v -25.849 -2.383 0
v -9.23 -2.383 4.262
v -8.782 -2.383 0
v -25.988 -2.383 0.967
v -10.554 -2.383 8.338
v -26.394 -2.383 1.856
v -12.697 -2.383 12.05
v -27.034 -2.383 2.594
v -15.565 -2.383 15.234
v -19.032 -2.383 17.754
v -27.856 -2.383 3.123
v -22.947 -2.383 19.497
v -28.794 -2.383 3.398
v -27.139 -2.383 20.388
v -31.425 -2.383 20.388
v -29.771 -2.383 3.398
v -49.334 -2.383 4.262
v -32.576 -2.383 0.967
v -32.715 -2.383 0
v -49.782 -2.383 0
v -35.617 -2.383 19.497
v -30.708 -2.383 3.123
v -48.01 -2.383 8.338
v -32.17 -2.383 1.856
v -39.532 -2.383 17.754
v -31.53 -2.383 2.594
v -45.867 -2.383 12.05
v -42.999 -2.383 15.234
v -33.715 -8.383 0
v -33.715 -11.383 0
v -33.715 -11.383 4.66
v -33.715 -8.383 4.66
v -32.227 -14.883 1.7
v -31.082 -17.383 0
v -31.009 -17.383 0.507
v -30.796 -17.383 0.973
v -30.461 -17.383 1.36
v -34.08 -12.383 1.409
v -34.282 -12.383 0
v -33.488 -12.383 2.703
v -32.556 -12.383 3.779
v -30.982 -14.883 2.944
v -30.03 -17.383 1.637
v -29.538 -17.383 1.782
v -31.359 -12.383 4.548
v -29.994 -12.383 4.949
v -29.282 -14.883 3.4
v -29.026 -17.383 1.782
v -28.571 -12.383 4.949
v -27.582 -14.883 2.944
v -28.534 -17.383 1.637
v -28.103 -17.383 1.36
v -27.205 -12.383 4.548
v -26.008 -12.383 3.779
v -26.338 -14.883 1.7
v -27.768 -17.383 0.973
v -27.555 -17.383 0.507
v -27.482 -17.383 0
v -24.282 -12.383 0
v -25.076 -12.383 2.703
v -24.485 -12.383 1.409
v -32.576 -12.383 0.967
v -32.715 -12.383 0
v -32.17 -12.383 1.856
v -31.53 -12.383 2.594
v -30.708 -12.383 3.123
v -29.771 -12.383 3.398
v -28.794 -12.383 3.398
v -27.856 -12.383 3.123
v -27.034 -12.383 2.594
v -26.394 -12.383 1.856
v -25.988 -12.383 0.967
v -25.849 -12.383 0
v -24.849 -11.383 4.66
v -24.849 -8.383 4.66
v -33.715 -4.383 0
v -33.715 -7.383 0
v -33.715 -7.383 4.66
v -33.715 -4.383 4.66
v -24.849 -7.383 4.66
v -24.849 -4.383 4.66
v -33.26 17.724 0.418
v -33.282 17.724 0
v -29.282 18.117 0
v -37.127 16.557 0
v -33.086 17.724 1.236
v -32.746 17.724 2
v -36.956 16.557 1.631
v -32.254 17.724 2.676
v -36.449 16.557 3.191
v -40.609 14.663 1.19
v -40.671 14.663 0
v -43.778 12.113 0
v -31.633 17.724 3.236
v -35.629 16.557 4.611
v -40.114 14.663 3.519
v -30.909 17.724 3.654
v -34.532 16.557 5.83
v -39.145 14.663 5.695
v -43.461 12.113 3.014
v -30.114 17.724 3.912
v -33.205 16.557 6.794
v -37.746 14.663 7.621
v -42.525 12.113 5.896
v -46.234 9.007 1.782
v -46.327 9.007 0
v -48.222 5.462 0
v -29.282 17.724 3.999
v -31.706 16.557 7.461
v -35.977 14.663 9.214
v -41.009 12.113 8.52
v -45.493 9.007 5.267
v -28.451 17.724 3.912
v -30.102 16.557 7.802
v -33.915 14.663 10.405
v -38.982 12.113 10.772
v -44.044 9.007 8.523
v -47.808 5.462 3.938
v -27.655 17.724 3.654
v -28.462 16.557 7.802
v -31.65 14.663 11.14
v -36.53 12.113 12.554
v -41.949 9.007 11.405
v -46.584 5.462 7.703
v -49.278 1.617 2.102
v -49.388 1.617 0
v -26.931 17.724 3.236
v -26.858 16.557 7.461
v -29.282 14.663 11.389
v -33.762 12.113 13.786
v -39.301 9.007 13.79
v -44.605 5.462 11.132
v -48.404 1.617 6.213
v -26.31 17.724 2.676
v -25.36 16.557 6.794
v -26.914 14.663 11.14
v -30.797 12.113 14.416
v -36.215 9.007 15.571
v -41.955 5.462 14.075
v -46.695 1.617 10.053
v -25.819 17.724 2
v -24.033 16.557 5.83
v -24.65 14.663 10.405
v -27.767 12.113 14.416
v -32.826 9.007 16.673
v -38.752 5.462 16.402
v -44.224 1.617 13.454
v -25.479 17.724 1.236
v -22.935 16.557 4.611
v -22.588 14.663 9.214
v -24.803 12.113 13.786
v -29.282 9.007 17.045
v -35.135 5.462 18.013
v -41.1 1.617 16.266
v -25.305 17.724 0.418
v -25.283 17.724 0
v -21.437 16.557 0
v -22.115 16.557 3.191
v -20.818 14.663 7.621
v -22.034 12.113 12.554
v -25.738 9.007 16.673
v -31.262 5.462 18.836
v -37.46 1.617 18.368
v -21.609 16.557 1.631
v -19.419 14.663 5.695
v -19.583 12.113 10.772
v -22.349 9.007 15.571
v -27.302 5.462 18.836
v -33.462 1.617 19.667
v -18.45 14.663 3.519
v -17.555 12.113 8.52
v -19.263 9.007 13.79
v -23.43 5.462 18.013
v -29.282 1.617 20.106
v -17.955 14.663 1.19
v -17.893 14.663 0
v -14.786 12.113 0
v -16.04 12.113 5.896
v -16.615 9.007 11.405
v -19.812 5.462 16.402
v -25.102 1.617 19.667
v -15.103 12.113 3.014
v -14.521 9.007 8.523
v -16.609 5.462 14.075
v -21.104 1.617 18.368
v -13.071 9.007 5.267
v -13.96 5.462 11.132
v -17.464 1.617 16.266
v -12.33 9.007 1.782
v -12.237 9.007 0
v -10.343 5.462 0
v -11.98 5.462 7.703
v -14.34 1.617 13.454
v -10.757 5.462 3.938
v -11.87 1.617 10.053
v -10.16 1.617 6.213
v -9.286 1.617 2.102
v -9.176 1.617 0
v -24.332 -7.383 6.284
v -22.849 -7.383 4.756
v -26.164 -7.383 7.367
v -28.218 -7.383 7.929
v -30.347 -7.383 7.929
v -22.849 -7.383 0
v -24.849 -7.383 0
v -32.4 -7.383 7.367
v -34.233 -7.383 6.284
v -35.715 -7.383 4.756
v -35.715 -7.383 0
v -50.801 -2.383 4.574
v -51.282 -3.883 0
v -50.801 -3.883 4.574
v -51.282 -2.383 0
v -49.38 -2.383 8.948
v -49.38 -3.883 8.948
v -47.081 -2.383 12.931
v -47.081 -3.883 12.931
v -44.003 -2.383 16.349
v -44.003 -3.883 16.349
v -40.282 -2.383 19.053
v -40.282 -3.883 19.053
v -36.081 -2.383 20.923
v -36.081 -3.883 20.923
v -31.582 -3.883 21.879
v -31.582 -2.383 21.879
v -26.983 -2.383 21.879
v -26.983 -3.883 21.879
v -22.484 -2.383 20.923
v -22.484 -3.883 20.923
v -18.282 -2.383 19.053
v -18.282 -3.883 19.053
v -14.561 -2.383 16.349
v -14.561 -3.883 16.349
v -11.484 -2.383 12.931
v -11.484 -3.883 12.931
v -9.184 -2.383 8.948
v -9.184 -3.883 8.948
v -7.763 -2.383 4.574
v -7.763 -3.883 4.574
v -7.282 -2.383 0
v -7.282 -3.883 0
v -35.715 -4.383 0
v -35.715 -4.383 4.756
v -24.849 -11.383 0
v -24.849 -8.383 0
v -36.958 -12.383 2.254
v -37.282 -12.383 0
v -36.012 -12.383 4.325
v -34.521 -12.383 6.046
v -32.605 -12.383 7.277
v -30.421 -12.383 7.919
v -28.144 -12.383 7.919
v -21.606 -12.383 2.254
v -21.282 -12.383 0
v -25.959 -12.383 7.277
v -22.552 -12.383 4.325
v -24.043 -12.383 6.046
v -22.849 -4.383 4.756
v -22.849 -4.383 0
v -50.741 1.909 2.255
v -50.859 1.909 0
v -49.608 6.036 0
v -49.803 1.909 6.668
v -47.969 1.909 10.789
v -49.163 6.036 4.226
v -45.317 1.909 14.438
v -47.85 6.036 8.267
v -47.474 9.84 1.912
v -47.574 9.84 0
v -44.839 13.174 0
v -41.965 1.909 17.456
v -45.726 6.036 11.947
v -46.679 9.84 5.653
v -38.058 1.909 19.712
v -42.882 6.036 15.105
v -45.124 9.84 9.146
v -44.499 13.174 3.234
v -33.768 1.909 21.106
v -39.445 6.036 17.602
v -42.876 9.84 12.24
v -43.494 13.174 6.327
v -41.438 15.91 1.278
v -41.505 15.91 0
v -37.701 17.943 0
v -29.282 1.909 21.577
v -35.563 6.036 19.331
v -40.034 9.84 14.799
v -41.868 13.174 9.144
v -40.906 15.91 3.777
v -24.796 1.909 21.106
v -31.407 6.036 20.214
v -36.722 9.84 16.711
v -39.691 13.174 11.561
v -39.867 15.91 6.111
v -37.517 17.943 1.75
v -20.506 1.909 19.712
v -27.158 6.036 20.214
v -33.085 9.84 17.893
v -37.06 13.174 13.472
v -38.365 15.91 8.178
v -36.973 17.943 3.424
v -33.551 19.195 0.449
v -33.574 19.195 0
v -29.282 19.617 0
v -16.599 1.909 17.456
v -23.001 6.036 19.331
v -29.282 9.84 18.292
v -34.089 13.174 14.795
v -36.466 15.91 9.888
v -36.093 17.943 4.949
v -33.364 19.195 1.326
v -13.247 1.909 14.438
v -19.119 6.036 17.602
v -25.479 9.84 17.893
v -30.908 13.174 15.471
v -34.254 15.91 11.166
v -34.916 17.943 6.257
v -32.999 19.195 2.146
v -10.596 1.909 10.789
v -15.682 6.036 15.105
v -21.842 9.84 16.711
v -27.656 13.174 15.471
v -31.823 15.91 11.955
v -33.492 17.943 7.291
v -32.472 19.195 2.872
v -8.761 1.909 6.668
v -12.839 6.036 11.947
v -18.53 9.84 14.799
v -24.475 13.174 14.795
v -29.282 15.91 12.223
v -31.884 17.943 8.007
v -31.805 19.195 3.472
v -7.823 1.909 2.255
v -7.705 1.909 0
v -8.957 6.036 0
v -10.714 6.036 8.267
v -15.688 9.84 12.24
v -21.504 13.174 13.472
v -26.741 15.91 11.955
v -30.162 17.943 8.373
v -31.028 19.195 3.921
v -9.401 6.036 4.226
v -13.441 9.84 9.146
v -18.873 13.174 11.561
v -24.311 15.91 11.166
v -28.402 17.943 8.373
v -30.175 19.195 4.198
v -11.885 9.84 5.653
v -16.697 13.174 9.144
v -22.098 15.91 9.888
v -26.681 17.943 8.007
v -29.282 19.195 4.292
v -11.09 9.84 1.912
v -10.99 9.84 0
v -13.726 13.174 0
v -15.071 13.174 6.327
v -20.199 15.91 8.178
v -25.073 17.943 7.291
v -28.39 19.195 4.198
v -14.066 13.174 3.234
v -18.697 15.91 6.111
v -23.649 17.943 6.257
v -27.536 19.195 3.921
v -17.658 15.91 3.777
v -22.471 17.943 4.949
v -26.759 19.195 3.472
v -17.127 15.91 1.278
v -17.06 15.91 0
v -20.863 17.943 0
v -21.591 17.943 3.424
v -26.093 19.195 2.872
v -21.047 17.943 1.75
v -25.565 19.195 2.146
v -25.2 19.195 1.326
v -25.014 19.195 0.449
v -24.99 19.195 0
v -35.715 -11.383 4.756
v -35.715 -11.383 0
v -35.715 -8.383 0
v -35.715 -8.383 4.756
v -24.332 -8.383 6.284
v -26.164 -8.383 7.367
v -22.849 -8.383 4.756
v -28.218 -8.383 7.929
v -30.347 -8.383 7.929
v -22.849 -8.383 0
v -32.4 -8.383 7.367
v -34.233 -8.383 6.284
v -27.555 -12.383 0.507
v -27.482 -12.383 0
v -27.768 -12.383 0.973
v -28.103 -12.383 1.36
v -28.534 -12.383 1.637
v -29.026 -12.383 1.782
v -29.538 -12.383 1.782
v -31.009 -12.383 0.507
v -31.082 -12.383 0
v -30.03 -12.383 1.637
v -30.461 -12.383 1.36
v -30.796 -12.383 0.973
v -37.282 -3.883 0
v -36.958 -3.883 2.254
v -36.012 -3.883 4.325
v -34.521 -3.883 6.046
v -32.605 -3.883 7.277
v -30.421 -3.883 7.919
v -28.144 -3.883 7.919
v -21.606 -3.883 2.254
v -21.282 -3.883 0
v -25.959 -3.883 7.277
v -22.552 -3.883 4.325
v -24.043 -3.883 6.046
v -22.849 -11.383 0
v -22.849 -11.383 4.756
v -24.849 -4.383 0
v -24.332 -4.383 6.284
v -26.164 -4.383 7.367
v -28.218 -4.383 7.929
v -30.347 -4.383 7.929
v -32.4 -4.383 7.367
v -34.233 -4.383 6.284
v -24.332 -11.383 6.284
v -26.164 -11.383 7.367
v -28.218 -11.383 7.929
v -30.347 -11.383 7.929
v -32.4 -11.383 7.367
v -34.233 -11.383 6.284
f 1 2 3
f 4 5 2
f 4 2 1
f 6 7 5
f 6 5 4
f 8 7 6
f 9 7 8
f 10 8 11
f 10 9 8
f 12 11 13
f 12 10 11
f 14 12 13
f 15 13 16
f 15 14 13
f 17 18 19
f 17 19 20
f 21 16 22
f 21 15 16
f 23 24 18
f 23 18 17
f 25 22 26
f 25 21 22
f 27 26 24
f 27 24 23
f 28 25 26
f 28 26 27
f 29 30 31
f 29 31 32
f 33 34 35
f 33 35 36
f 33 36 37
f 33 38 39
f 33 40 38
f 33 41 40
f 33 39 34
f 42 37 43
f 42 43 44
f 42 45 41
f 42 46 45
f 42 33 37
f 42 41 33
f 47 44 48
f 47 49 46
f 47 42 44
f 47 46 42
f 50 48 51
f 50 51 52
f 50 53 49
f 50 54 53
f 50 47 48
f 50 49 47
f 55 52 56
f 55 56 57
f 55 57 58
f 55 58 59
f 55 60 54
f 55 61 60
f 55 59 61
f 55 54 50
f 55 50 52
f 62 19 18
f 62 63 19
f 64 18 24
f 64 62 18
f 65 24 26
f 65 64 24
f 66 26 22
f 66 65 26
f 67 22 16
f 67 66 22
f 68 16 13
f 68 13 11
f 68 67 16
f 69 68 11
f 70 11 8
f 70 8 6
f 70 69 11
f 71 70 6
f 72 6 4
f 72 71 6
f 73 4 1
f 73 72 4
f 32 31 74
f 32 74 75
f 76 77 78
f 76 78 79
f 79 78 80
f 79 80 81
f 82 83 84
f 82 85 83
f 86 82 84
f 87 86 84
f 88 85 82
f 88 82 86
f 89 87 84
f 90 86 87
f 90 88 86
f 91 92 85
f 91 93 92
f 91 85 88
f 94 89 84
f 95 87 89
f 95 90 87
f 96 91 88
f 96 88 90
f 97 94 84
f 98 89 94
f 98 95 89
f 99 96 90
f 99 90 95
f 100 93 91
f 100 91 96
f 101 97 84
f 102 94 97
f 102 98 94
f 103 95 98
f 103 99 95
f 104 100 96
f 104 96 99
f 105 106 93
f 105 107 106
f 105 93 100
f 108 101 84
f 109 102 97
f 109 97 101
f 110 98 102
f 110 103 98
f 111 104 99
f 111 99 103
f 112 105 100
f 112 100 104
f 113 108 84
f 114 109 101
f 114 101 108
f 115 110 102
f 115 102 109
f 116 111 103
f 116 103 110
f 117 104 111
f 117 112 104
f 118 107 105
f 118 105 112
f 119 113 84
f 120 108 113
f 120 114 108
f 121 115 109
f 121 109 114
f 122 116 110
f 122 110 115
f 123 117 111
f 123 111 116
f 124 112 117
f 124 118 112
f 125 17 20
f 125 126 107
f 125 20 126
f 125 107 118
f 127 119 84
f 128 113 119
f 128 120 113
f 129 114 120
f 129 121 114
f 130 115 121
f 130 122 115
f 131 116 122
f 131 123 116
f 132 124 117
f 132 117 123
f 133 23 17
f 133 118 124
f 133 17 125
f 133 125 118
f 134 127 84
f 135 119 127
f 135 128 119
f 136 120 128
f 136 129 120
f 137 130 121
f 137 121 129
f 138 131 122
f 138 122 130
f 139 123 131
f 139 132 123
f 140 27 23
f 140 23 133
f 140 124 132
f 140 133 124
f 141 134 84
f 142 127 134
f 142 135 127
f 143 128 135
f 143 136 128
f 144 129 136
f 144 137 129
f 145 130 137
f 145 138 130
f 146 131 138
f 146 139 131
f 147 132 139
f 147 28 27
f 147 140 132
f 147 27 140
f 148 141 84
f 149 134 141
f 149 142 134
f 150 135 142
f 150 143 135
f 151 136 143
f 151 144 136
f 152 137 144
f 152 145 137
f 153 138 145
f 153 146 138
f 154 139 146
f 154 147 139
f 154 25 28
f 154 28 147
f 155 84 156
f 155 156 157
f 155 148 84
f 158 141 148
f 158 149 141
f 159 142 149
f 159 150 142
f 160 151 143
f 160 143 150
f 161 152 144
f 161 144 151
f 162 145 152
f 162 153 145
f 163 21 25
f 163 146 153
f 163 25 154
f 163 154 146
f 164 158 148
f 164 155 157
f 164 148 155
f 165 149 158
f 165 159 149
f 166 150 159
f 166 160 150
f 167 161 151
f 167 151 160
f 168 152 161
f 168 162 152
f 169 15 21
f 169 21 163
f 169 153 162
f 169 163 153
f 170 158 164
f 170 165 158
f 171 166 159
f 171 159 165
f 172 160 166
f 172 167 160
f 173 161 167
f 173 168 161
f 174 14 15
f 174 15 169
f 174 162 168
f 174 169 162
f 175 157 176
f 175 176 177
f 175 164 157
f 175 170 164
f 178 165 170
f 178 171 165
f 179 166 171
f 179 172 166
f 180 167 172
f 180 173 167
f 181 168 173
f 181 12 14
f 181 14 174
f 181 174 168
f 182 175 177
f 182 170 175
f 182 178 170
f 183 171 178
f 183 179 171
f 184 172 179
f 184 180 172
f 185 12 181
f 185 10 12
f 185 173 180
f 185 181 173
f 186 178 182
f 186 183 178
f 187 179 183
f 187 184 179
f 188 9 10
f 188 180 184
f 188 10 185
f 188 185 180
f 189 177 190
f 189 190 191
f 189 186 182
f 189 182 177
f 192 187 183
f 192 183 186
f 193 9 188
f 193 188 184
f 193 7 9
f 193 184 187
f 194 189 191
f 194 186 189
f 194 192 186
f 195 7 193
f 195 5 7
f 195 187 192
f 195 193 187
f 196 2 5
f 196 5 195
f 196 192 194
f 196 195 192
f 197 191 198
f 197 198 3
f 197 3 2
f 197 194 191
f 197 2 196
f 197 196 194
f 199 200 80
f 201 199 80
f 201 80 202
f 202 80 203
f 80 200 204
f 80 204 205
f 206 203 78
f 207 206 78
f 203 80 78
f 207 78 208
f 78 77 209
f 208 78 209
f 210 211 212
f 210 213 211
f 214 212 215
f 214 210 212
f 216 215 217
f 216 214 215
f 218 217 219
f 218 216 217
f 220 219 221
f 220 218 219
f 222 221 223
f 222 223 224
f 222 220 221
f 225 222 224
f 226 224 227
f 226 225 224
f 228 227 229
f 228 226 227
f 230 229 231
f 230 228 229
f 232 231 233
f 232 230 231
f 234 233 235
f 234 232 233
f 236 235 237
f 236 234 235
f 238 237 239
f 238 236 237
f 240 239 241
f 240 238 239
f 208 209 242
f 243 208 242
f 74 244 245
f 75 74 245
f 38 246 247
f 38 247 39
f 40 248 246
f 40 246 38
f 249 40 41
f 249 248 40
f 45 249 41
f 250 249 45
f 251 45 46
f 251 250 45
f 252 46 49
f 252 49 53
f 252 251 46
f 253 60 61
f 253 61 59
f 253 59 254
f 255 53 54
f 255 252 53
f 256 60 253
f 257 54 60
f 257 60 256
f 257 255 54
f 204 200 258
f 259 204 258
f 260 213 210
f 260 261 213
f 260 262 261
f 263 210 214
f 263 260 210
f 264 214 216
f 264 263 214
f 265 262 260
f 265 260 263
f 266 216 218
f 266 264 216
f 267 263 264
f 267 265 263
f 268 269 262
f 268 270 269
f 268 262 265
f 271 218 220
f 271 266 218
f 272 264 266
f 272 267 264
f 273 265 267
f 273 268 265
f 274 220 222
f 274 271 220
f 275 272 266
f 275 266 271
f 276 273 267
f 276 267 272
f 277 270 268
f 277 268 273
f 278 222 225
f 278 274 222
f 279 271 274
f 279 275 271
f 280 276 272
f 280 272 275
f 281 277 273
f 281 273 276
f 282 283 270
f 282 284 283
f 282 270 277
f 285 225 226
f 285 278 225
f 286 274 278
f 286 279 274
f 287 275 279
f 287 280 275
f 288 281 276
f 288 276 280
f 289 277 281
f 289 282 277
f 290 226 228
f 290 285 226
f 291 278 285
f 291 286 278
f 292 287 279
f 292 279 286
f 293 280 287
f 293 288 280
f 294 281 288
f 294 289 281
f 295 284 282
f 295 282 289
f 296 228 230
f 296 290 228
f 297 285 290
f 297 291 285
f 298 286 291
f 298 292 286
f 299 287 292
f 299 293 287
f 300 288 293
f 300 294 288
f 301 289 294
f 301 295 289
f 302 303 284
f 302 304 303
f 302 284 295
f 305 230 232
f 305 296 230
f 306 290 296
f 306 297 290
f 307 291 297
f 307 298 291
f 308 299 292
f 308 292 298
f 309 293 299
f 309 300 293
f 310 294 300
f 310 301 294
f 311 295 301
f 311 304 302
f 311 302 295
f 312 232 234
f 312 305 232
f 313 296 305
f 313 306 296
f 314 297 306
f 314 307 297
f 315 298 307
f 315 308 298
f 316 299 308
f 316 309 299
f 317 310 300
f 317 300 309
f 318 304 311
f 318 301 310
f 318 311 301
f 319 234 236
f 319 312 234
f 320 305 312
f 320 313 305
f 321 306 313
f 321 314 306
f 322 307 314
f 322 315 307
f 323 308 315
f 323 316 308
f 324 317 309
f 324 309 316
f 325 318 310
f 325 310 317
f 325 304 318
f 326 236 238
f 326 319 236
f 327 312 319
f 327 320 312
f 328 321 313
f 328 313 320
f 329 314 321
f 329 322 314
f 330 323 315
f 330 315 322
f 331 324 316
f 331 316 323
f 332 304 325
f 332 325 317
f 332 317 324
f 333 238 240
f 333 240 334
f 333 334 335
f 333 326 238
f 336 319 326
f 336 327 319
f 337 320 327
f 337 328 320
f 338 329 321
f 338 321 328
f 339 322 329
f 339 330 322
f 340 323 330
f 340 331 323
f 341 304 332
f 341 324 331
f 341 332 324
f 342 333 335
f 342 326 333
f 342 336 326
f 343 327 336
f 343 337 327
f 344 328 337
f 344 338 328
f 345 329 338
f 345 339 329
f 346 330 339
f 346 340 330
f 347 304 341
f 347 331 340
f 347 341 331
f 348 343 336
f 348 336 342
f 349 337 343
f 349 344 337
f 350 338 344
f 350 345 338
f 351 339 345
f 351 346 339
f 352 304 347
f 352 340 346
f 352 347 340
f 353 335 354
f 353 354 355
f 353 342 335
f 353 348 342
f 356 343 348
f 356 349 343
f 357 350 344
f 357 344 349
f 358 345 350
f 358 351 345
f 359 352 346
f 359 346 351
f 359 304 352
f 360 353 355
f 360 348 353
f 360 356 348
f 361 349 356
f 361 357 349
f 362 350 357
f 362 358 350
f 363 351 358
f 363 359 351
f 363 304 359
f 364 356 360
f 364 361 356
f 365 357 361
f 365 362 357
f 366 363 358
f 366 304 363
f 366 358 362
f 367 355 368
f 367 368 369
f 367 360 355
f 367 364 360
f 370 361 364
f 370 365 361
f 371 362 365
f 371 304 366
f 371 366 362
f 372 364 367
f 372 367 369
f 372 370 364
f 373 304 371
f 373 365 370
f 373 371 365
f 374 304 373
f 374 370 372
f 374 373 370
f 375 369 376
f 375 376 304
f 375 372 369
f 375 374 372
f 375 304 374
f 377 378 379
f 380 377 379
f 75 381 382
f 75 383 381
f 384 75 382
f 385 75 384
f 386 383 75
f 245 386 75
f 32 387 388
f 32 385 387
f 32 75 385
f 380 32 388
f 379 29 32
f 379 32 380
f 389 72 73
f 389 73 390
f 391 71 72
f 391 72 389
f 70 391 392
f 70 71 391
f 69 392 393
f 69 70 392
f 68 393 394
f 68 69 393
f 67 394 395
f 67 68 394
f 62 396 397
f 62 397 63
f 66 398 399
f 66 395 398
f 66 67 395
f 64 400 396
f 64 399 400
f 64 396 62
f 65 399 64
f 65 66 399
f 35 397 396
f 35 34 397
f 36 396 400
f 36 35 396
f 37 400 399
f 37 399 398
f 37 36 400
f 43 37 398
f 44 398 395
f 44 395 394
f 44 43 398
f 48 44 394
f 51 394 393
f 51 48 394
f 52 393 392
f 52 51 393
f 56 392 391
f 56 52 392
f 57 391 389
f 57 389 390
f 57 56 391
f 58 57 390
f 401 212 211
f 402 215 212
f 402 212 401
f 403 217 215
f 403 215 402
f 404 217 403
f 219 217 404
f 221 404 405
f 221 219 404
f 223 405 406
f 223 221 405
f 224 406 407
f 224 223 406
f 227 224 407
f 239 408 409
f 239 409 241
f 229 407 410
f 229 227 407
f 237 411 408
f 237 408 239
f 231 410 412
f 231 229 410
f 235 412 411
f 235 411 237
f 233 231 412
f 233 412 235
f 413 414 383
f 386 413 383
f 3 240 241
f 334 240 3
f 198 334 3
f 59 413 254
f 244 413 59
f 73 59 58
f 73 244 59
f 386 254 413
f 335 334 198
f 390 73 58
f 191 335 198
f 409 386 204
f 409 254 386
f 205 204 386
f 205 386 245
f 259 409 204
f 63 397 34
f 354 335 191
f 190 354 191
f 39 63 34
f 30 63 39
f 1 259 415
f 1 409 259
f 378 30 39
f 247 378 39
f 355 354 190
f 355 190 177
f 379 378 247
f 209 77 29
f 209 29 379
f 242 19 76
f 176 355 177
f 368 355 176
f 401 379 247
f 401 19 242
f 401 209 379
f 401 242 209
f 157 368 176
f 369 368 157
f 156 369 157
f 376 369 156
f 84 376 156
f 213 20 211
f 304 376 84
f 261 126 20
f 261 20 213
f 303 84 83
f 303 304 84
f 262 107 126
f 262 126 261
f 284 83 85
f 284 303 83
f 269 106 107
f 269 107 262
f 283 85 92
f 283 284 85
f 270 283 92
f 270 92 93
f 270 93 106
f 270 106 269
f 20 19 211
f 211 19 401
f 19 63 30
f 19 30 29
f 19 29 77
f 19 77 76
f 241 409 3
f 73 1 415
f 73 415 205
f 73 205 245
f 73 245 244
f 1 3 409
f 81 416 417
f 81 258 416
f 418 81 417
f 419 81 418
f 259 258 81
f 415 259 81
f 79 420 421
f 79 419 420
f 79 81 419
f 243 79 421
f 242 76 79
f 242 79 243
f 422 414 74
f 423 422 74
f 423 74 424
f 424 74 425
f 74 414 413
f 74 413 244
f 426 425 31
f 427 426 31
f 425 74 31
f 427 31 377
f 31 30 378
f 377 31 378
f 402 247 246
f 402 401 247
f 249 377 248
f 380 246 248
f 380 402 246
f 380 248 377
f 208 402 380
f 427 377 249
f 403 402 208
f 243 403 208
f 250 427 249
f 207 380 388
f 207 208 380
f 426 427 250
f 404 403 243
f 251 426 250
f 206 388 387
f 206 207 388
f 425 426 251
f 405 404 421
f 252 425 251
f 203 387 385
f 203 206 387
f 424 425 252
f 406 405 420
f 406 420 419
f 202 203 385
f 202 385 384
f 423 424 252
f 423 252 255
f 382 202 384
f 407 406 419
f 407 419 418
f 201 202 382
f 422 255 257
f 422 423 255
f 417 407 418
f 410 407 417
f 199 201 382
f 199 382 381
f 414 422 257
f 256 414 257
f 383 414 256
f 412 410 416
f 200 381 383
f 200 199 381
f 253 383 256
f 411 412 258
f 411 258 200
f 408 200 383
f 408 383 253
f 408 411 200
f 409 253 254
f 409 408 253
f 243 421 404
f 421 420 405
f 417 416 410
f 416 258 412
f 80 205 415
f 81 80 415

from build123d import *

# Parameters (mm, degrees)
REVOLUCI_N1_ANGLE     = 180
CROQUIS2_W            = 2
CROQUIS2_H            = 3
CORTAR_EXTRUIR1_DEPTH = 20
CORTAR_EXTRUIR2_DEPTH = 8.865505


with BuildPart() as part:
    # Croquis1 → Revolución1 (revolve)
    with BuildSketch(Plane.XY):
        with BuildLine():
            Line((-49.782166939, -2.382597623), (-32.714919408, -2.382597623))
            Line((-32.714919408, -2.382597623), (-32.714919408, -12.382597623))
            Line((-32.714919408, -12.382597623), (-31.082166939, -12.382597623))
            Line((-31.082166939, -12.382597623), (-31.082166939, -17.382597623))
            Line((-31.082166939, -17.382597623), (-34.282166939, -12.382597623))
            Line((-34.282166939, -12.382597623), (-37.282166939, -12.382597623))
            Line((-37.282166939, -12.382597623), (-37.282166939, -3.882597623))
            Line((-37.282166939, -3.882597623), (-38.282166939, -3.882597623))
            Line((-38.282166939, -3.882597623), (-41.282166939, -3.882597623))
            Line((-41.282166939, -3.882597623), (-51.282166939, -3.882597623))
            Line((-51.282166939, -3.882597623), (-51.282166939, -2.382597623))
            ThreePointArc((-51.282166939, -2.382597623), (-44.838516125, 13.173751563), (-29.282166939, 19.617402377))
            Line((-29.282166939, 19.617402377), (-29.282166939, 18.117402377))
            ThreePointArc((-29.282166939, 18.117402377), (-43.777855954, 12.113091391), (-49.782166939, -2.382597623))
        make_face()
    revolve(axis=Axis((-29.282166939, 18.117402377, 0), (0, 1, 0)), revolution_arc=REVOLUCI_N1_ANGLE)

    # Croquis2 → Cortar-Extruir1 (cut)
    with BuildSketch(Plane(origin=(0, 0, 0), x_dir=(-1, 0, 0), z_dir=(0, 0, -1))):
        with Locations((34.714919408, -9.882597623)):
            Rectangle(CROQUIS2_W, CROQUIS2_H)
        with Locations((34.714919408, -5.882597623)):
            Rectangle(CROQUIS2_W, CROQUIS2_H)
        with Locations((23.84941447, -9.882597623)):
            Rectangle(CROQUIS2_W, CROQUIS2_H)
        with Locations((23.84941447, -5.882597623)):
            Rectangle(CROQUIS2_W, CROQUIS2_H)
    extrude(amount=-CORTAR_EXTRUIR1_DEPTH, mode=Mode.SUBTRACT)

    # Croquis3 → Cortar-Extruir2 (cut)
    with BuildSketch(Plane.ZY.offset(33.714919408)):
        Polygon((6.659632539, -7.382597623), (4.659632539, -7.382597623), (4.659632539, -4.382597623), (9.659632539, -4.382597623), (9.659632539, -7.382597623), align=None)
        Polygon((6.659632539, -11.382597623), (4.659632539, -11.382597623), (4.659632539, -8.382597623), (9.659632539, -8.382597623), (9.659632539, -11.382597623), align=None)
    extrude(amount=-CORTAR_EXTRUIR2_DEPTH, mode=Mode.SUBTRACT)


solid = part.part
